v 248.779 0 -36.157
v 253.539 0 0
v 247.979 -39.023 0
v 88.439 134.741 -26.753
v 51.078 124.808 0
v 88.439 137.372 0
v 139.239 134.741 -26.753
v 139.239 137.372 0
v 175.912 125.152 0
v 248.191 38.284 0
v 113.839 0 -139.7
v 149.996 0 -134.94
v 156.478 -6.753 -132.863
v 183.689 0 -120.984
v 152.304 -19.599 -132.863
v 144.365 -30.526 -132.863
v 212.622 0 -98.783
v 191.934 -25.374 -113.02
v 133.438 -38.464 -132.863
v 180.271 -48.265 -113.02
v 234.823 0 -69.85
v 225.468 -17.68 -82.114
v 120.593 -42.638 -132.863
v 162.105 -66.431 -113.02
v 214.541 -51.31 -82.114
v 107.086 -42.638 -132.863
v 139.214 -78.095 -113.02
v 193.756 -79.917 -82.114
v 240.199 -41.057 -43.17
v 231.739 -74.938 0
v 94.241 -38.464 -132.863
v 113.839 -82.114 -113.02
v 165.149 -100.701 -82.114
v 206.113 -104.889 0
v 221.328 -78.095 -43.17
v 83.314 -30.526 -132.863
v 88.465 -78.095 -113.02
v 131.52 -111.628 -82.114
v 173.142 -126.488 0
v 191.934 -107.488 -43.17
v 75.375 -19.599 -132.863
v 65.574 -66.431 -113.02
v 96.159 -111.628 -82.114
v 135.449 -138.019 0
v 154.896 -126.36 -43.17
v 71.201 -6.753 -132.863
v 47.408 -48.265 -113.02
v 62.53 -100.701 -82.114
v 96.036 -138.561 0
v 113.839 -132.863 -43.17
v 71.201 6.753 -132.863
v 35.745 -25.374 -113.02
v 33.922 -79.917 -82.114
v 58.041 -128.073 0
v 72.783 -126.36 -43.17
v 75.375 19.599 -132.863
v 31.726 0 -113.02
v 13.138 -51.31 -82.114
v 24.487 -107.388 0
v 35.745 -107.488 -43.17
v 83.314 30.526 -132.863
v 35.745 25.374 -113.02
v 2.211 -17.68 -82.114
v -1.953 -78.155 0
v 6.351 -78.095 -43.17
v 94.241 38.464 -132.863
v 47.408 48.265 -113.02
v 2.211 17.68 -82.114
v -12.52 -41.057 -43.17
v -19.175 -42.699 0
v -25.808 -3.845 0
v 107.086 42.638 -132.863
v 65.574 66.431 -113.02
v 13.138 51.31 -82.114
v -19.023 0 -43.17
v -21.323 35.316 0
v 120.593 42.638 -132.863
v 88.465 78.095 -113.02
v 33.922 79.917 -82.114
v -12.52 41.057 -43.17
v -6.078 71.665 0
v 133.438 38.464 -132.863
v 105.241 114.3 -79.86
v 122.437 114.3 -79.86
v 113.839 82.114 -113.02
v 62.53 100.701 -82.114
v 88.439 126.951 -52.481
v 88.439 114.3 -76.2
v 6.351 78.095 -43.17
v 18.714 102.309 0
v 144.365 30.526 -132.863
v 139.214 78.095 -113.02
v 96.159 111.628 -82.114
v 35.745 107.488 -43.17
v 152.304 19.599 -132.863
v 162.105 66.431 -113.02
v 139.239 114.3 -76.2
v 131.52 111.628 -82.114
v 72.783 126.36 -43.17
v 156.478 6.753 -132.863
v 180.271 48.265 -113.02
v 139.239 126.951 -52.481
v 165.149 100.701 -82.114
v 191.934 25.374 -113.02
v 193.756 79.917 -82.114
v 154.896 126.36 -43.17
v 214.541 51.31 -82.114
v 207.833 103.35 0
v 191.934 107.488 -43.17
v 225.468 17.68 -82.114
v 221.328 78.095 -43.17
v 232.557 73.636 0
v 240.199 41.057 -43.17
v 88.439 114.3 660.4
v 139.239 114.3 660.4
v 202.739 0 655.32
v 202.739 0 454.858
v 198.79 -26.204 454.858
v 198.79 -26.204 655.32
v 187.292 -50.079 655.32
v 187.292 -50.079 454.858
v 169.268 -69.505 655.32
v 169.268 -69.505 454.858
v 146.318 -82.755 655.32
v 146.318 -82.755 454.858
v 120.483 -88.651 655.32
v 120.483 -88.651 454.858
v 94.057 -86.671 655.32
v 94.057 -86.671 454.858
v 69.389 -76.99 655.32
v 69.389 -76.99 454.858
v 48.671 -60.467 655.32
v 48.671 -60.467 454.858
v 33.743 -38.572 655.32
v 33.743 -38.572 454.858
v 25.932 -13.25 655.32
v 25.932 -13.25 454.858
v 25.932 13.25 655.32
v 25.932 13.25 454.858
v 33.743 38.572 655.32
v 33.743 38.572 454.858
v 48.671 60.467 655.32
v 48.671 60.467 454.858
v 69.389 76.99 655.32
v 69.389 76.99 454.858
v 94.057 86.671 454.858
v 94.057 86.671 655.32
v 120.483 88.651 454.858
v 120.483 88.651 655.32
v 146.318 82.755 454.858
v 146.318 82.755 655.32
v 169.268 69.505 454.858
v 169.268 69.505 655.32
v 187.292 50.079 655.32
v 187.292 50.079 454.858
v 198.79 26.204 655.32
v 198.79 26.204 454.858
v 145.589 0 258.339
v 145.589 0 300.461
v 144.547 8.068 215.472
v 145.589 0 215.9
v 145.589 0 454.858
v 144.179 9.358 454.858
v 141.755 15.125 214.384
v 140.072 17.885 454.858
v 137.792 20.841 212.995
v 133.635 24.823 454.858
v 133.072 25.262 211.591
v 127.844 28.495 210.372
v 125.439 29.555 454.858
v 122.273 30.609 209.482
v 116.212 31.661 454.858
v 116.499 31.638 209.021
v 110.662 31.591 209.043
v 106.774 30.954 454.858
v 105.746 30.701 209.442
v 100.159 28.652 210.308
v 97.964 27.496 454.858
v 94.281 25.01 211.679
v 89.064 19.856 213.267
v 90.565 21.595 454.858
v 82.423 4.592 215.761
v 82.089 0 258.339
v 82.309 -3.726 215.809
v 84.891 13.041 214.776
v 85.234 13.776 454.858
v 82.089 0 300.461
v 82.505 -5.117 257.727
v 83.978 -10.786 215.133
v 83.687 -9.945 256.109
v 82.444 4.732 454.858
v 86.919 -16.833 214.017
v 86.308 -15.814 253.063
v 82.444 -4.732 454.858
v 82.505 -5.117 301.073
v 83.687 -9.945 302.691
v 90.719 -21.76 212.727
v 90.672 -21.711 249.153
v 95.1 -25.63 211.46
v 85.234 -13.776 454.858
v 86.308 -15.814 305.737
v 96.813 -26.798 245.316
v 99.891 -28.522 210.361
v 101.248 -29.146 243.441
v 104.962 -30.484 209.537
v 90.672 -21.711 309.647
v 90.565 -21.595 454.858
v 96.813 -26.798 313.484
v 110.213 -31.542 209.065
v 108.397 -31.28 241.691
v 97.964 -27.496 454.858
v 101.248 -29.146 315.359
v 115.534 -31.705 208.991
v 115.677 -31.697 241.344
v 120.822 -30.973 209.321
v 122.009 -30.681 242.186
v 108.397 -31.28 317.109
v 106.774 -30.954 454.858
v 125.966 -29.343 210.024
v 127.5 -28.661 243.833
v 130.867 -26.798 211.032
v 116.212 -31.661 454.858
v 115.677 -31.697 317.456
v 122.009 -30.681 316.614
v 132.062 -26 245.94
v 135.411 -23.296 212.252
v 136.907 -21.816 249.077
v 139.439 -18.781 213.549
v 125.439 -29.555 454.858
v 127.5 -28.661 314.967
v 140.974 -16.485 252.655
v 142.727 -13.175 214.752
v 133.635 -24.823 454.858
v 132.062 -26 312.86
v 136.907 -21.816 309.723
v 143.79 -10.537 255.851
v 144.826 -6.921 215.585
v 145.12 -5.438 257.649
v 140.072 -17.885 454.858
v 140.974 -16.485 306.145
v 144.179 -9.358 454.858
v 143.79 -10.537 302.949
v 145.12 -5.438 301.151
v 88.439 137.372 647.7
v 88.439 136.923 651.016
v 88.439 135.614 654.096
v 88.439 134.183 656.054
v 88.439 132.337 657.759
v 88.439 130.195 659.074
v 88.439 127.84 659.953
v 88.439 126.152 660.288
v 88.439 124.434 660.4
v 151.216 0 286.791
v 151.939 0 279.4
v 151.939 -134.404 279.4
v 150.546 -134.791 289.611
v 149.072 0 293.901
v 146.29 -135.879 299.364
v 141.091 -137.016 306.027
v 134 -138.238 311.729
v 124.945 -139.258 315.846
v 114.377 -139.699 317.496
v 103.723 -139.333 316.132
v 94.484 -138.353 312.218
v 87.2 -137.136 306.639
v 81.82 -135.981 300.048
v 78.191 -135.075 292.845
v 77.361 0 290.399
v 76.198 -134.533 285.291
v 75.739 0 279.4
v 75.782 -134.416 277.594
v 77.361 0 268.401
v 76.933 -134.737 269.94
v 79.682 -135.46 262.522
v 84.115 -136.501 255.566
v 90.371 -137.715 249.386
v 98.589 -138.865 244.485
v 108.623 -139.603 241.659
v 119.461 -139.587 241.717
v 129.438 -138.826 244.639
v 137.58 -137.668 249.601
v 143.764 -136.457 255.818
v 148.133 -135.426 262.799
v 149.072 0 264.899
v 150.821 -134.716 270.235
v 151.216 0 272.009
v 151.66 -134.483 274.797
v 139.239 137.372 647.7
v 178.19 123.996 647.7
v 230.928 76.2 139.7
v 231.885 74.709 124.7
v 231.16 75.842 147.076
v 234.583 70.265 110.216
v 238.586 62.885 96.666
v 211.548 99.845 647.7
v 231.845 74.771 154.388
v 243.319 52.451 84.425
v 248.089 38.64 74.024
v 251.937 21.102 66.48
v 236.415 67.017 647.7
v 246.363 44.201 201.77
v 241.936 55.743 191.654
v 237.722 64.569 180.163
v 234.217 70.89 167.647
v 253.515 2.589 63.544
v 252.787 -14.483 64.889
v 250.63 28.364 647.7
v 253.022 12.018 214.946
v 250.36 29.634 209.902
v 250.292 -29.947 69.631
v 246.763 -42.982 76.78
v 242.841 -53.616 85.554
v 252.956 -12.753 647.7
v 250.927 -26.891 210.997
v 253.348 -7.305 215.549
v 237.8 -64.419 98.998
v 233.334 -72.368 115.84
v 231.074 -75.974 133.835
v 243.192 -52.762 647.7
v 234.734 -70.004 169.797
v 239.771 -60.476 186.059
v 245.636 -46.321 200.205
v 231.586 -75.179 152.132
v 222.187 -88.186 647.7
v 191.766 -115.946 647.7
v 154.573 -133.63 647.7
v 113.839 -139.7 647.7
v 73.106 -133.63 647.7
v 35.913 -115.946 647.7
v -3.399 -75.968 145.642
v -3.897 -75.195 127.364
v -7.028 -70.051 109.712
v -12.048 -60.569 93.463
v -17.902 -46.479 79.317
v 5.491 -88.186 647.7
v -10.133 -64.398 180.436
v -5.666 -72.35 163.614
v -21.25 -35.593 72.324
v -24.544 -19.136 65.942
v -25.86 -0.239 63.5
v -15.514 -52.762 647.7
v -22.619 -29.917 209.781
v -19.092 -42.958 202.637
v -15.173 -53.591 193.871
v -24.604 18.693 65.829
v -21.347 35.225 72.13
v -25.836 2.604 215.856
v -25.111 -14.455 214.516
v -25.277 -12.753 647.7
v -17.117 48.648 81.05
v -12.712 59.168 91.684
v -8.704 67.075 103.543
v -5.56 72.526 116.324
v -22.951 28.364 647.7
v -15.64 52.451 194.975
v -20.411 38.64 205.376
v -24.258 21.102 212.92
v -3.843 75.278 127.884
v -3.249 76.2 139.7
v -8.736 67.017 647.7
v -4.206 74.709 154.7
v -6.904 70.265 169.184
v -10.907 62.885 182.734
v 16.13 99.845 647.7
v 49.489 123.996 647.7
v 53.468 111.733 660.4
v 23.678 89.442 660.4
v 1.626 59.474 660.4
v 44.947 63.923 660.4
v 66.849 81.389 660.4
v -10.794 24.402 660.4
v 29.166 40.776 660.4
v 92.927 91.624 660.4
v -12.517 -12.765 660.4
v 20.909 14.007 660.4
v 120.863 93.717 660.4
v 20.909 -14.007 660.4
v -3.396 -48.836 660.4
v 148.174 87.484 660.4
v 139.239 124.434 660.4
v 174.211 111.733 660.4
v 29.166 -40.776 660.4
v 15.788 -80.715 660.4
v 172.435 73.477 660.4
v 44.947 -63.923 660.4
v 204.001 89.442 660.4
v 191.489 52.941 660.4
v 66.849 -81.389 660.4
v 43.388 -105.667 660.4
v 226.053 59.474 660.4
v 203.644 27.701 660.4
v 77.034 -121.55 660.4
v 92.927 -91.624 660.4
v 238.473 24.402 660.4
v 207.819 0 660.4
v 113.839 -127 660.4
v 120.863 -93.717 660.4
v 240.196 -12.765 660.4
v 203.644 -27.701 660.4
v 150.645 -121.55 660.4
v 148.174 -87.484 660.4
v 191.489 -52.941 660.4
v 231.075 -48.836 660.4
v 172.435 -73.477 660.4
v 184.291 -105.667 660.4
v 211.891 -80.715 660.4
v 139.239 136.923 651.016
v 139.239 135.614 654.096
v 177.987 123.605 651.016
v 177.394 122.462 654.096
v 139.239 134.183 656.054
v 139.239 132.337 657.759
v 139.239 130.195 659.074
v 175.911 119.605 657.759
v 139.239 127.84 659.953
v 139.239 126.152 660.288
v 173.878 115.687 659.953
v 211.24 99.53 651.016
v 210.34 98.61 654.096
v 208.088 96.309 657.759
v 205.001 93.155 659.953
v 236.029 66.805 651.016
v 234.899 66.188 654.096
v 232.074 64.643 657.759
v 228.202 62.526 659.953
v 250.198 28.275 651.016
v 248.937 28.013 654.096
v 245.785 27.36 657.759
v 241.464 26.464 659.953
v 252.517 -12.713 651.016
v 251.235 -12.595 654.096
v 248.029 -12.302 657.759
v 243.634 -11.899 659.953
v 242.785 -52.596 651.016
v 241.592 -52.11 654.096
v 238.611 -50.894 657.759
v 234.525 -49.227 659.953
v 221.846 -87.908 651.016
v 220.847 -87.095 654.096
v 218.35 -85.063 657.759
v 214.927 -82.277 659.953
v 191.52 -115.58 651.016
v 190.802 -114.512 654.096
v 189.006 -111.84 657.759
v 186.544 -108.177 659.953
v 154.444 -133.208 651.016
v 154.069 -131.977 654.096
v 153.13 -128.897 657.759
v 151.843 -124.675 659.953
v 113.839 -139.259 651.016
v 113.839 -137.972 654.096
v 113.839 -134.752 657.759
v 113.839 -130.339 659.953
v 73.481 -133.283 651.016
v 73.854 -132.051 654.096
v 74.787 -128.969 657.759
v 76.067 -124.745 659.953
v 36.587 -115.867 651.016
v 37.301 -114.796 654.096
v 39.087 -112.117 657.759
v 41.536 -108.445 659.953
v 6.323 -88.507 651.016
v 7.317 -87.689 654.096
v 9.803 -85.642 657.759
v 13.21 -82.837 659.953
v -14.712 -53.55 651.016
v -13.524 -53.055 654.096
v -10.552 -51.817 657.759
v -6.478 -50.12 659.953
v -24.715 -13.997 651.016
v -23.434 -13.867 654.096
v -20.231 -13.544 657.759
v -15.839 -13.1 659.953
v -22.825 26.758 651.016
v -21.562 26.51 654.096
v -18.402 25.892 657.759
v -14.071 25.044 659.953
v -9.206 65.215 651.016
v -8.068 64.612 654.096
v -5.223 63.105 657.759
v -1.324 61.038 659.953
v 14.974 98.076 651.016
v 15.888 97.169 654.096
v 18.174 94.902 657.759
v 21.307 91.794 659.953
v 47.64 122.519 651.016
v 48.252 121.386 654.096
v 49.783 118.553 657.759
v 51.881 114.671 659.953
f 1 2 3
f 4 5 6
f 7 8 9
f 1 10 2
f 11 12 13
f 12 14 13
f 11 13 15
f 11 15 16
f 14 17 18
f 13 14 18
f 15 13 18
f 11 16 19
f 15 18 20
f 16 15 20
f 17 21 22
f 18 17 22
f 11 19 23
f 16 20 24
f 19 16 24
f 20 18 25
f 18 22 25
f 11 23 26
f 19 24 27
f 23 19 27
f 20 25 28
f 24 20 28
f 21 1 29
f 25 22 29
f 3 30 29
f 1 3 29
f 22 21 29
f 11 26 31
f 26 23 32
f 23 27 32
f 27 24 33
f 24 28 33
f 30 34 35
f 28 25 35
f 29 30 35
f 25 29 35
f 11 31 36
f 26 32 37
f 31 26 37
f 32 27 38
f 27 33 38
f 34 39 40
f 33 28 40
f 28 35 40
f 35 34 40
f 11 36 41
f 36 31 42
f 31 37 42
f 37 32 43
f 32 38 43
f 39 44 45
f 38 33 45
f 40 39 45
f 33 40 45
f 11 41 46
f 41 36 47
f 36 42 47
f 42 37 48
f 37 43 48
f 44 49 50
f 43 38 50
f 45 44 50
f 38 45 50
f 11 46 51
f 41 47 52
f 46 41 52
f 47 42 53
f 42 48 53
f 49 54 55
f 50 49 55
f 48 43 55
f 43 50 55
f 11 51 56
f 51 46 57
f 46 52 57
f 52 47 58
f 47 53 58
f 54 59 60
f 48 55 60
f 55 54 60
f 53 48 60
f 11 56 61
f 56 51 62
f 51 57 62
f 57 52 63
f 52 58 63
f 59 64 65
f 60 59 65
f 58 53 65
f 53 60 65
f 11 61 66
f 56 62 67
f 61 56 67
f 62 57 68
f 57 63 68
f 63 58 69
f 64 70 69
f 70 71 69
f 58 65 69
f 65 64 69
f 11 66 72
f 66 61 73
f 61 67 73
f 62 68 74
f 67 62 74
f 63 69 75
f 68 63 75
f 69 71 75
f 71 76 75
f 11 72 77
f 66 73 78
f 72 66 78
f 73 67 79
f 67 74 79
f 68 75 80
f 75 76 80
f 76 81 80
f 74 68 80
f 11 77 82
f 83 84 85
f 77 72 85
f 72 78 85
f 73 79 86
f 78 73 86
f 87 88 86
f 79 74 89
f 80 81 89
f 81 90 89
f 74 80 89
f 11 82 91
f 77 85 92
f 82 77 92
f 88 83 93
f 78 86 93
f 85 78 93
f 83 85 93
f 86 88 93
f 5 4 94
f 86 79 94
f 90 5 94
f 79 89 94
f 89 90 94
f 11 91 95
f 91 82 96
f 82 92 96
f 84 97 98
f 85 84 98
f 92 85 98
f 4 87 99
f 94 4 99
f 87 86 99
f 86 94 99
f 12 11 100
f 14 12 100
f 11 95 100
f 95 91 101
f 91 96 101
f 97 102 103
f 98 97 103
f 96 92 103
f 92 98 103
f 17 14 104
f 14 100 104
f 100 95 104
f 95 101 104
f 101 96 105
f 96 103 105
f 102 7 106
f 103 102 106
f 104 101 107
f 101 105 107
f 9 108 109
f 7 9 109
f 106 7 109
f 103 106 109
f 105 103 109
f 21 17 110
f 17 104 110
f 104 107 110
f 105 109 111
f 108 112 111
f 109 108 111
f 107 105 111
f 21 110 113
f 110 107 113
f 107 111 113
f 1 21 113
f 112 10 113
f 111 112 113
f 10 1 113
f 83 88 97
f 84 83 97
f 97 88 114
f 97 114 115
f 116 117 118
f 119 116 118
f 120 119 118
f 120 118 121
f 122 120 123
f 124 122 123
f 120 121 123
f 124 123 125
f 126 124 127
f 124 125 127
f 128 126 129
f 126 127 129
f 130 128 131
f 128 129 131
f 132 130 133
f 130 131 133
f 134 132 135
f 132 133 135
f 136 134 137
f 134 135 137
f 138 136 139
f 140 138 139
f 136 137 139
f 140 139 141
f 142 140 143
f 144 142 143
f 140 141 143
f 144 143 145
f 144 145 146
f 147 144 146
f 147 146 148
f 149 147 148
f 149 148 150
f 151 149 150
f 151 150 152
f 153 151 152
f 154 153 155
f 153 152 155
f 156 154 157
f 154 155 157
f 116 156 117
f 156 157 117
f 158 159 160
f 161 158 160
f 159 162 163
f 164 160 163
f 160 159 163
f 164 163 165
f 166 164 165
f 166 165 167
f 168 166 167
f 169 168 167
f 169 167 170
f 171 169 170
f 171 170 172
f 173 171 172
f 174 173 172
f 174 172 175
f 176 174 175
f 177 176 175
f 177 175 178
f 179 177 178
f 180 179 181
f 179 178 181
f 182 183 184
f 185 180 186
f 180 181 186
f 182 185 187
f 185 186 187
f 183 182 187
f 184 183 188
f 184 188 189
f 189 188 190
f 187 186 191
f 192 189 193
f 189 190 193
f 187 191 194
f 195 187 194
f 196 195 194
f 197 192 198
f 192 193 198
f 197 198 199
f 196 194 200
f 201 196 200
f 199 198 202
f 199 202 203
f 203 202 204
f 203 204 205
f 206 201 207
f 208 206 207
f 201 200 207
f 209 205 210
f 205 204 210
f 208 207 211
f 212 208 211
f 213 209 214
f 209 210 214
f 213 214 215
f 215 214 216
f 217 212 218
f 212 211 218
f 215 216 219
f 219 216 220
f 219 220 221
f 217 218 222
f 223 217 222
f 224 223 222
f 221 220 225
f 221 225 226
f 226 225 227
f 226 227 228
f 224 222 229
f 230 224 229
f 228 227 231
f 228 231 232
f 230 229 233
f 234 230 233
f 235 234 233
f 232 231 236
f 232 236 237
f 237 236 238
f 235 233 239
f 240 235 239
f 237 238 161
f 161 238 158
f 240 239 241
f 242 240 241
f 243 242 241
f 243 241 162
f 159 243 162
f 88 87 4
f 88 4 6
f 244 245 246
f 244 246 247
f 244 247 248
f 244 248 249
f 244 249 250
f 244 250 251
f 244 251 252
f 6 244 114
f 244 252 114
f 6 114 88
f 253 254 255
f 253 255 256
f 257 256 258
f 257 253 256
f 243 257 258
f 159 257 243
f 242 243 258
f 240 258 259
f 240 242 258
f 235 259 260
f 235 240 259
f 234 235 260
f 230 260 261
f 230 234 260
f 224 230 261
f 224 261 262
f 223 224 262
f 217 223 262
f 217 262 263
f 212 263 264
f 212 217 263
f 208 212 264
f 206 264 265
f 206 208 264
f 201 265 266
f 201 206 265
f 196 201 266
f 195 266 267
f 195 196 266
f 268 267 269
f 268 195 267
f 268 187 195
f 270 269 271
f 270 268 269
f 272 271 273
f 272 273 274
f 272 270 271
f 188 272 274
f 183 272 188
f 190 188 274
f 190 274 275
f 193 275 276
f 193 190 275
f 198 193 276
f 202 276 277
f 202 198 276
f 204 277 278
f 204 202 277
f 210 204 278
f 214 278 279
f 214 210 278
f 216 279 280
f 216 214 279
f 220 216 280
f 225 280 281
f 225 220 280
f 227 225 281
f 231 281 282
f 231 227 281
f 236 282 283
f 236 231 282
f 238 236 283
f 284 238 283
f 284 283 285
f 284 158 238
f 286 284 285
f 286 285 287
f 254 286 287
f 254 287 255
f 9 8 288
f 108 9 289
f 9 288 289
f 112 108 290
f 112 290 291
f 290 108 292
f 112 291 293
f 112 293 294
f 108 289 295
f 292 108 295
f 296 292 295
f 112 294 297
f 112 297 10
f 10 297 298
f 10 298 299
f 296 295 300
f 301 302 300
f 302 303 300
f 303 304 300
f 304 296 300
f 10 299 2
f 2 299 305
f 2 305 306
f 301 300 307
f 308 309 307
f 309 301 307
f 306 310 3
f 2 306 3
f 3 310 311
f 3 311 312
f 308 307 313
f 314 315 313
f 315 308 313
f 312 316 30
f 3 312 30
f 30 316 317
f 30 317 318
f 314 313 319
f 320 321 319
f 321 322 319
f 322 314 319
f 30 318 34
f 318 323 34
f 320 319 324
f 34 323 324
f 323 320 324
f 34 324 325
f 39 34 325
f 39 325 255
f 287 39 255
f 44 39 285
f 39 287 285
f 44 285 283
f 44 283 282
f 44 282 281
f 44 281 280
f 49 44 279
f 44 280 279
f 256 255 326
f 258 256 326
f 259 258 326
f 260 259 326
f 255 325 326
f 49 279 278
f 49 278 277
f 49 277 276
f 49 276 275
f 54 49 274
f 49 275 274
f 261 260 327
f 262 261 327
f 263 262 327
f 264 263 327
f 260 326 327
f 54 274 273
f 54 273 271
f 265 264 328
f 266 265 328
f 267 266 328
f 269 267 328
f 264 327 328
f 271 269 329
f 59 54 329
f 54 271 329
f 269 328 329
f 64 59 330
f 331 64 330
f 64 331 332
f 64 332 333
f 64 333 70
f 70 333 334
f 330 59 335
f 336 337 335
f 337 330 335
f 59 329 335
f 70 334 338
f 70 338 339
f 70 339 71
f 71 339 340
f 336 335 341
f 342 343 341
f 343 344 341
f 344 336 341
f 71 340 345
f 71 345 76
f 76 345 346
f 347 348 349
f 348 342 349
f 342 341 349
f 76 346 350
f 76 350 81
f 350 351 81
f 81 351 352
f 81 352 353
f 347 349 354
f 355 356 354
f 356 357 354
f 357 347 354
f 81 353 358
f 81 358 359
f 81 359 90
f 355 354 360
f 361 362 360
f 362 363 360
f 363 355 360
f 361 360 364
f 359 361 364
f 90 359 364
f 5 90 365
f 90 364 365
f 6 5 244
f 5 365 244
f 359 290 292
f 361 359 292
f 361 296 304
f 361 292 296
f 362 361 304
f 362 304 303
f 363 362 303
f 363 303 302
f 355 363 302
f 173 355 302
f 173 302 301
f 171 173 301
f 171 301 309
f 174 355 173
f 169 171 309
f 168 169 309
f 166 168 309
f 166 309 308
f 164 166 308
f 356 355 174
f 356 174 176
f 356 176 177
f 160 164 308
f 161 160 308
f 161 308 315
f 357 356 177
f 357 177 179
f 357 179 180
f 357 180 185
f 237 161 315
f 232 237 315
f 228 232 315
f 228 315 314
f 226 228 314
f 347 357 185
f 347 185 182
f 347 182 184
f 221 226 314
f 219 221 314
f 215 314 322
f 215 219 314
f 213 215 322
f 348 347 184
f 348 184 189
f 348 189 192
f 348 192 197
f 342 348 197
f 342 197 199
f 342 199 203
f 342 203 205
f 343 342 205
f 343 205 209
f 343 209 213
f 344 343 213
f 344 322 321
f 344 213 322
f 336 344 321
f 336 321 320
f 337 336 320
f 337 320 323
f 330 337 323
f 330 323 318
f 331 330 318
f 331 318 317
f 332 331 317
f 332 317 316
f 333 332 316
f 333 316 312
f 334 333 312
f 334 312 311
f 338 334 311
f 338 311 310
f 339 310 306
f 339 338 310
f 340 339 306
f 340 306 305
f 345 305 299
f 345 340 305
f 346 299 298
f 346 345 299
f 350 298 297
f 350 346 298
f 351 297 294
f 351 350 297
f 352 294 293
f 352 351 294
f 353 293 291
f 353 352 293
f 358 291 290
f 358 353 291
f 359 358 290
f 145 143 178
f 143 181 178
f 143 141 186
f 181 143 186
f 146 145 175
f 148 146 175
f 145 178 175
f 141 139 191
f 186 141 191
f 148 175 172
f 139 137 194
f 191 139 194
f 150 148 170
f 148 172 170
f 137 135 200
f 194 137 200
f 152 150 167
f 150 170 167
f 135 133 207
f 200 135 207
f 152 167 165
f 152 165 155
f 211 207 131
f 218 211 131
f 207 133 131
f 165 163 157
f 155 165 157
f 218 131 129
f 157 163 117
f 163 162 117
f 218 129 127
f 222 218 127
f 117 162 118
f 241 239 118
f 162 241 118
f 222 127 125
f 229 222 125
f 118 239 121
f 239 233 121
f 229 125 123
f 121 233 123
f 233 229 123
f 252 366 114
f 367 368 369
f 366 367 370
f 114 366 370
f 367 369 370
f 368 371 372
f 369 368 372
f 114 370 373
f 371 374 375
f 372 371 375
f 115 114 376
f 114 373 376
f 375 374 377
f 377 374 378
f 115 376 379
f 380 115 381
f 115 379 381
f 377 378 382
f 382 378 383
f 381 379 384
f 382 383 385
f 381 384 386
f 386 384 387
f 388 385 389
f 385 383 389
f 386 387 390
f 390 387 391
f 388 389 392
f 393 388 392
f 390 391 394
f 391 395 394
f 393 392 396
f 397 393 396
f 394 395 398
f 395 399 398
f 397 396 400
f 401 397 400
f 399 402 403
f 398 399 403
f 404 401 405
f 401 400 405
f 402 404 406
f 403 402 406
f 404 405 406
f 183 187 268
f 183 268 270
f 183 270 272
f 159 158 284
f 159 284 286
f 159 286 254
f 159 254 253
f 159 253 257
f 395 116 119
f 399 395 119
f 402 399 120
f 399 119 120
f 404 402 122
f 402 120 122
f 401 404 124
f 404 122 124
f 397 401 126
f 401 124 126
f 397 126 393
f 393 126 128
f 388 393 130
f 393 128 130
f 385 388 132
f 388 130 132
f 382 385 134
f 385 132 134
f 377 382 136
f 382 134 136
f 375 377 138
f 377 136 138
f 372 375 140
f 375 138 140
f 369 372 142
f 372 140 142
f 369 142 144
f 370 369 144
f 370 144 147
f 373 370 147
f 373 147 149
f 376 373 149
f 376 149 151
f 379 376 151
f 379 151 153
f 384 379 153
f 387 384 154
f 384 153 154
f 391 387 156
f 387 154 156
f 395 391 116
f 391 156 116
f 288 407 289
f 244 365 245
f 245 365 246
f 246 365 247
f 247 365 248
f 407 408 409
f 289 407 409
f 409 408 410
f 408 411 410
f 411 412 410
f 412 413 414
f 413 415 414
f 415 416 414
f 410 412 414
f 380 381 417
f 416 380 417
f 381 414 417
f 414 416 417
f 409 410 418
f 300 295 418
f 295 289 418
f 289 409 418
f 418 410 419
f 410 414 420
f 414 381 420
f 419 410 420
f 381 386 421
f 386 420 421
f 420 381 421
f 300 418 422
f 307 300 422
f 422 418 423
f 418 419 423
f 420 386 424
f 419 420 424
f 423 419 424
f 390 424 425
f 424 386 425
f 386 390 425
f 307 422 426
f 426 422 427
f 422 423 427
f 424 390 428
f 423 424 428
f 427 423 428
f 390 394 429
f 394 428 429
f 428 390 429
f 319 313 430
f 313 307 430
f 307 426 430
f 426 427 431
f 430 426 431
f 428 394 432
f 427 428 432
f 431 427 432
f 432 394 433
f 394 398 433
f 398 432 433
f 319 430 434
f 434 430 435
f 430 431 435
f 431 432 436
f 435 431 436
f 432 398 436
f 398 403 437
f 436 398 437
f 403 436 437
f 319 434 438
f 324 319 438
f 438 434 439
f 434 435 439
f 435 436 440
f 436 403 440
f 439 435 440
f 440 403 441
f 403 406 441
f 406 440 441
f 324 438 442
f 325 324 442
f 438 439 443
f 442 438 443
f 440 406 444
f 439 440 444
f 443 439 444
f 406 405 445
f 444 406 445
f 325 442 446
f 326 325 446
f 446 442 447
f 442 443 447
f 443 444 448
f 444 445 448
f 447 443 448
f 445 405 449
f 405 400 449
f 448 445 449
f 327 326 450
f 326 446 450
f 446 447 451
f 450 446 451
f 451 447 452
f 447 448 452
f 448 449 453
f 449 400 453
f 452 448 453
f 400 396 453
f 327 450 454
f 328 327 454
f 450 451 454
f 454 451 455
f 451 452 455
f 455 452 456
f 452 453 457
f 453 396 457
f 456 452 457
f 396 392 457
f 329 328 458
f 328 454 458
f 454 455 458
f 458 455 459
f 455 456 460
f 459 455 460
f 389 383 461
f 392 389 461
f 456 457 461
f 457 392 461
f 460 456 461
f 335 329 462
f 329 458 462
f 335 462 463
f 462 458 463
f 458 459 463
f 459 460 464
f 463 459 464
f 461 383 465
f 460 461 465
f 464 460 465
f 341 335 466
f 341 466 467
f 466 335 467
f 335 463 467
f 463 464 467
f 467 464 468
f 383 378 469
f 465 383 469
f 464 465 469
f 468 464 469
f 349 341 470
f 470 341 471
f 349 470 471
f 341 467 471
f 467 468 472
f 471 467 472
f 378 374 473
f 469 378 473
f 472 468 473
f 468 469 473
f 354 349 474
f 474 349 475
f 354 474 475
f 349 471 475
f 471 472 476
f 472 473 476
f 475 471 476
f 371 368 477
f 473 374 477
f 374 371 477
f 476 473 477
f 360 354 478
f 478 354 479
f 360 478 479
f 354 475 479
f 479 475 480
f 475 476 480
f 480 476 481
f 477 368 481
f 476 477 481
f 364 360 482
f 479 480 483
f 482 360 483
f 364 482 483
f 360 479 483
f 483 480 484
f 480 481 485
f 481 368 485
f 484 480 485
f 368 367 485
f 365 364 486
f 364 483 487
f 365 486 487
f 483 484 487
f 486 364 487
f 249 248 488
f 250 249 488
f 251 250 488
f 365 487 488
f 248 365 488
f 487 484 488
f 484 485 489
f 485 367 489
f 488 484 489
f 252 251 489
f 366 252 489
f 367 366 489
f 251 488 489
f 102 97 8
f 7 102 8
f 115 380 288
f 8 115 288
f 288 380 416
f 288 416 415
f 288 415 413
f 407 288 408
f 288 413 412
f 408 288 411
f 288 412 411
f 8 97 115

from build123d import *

# Parameters (mm, degrees)
F2_SIZE   = 5.08
F4_DEPTH  = 806.27653
F6_R      = 76.2
F7_DEPTH  = 635.34323
F8_R      = 31.75
F9_DEPTH  = 343.56878
F10_R     = 38.1
F11_DEPTH = 418.60546


with BuildPart() as f1:
    # F0 (on Front) → F1 (revolve)
    with BuildSketch(Plane.XZ):
        with BuildLine():
            Line((202.739415619, 454.8578867186), (113.839415619, 454.8578867186))
            Line((113.839415619, 454.8578867186), (113.839415619, -139.7))
            ThreePointArc((113.839415619, -139.7), (212.6222329507, -98.7828173318), (253.539415619, 0))
            Line((253.539415619, 0), (253.539415619, 647.7))
            ThreePointArc((253.539415619, 647.7), (249.81967174, 656.6802561211), (240.839415619, 660.4))
            Line((240.839415619, 660.4), (202.739415619, 660.4))
            Line((202.739415619, 660.4), (202.739415619, 454.8578867186))
        make_face()
    revolve(axis=Axis((113.839415619, 0, 157.5789433593), (0, 0, -1)))

    # F2
    f2_edges = [f1.edges().sort_by_distance(p)[0] for p in [
        (24.939416, 0, 660.4),
    ]]
    chamfer(f2_edges, length=F2_SIZE)

    # F3 (on face) → F4 (cut)
    with BuildSketch(Plane.XY.offset(660.4)):
        with BuildLine():
            Line((139.239415619, 154.6271294355), (88.439415619, 154.6271294355))
            Line((88.439415619, 154.6271294355), (88.439415619, 124.4340789334))
            ThreePointArc((88.439415619, 124.4340789334), (113.839415619, 127), (139.239415619, 124.4340789334))
            Line((139.239415619, 124.4340789334), (139.239415619, 154.6271294355))
        make_face()
        with BuildLine():
            ThreePointArc((139.239415619, 124.4340789334), (113.839415619, 127), (88.439415619, 124.4340789334))
            Line((88.439415619, 124.4340789334), (88.439415619, 114.3))
            Line((88.439415619, 114.3), (139.239415619, 114.3))
            Line((139.239415619, 114.3), (139.239415619, 124.4340789334))
        make_face()
    extrude(amount=-F4_DEPTH, mode=Mode.SUBTRACT)

    # F6 (on offset) → F7 (cut)
    with BuildSketch(Plane.YZ.offset(-152.4)):
        with Locations((0, 139.7)):
            Circle(F6_R)
    extrude(amount=F7_DEPTH, mode=Mode.SUBTRACT)

    # F8 (on face) → F9 (cut)
    with BuildSketch(Plane.XY.offset(454.8578867186)):
        with Locations((113.839415619, 0)):
            Circle(F8_R)
    extrude(amount=-F9_DEPTH, mode=Mode.SUBTRACT)

    # F10 (on Front) → F11 (cut)
    with BuildSketch(Plane.XZ):
        with Locations((113.839415619, 279.4)):
            Circle(F10_R)
    extrude(amount=F11_DEPTH, mode=Mode.SUBTRACT)


solid = f1.part
